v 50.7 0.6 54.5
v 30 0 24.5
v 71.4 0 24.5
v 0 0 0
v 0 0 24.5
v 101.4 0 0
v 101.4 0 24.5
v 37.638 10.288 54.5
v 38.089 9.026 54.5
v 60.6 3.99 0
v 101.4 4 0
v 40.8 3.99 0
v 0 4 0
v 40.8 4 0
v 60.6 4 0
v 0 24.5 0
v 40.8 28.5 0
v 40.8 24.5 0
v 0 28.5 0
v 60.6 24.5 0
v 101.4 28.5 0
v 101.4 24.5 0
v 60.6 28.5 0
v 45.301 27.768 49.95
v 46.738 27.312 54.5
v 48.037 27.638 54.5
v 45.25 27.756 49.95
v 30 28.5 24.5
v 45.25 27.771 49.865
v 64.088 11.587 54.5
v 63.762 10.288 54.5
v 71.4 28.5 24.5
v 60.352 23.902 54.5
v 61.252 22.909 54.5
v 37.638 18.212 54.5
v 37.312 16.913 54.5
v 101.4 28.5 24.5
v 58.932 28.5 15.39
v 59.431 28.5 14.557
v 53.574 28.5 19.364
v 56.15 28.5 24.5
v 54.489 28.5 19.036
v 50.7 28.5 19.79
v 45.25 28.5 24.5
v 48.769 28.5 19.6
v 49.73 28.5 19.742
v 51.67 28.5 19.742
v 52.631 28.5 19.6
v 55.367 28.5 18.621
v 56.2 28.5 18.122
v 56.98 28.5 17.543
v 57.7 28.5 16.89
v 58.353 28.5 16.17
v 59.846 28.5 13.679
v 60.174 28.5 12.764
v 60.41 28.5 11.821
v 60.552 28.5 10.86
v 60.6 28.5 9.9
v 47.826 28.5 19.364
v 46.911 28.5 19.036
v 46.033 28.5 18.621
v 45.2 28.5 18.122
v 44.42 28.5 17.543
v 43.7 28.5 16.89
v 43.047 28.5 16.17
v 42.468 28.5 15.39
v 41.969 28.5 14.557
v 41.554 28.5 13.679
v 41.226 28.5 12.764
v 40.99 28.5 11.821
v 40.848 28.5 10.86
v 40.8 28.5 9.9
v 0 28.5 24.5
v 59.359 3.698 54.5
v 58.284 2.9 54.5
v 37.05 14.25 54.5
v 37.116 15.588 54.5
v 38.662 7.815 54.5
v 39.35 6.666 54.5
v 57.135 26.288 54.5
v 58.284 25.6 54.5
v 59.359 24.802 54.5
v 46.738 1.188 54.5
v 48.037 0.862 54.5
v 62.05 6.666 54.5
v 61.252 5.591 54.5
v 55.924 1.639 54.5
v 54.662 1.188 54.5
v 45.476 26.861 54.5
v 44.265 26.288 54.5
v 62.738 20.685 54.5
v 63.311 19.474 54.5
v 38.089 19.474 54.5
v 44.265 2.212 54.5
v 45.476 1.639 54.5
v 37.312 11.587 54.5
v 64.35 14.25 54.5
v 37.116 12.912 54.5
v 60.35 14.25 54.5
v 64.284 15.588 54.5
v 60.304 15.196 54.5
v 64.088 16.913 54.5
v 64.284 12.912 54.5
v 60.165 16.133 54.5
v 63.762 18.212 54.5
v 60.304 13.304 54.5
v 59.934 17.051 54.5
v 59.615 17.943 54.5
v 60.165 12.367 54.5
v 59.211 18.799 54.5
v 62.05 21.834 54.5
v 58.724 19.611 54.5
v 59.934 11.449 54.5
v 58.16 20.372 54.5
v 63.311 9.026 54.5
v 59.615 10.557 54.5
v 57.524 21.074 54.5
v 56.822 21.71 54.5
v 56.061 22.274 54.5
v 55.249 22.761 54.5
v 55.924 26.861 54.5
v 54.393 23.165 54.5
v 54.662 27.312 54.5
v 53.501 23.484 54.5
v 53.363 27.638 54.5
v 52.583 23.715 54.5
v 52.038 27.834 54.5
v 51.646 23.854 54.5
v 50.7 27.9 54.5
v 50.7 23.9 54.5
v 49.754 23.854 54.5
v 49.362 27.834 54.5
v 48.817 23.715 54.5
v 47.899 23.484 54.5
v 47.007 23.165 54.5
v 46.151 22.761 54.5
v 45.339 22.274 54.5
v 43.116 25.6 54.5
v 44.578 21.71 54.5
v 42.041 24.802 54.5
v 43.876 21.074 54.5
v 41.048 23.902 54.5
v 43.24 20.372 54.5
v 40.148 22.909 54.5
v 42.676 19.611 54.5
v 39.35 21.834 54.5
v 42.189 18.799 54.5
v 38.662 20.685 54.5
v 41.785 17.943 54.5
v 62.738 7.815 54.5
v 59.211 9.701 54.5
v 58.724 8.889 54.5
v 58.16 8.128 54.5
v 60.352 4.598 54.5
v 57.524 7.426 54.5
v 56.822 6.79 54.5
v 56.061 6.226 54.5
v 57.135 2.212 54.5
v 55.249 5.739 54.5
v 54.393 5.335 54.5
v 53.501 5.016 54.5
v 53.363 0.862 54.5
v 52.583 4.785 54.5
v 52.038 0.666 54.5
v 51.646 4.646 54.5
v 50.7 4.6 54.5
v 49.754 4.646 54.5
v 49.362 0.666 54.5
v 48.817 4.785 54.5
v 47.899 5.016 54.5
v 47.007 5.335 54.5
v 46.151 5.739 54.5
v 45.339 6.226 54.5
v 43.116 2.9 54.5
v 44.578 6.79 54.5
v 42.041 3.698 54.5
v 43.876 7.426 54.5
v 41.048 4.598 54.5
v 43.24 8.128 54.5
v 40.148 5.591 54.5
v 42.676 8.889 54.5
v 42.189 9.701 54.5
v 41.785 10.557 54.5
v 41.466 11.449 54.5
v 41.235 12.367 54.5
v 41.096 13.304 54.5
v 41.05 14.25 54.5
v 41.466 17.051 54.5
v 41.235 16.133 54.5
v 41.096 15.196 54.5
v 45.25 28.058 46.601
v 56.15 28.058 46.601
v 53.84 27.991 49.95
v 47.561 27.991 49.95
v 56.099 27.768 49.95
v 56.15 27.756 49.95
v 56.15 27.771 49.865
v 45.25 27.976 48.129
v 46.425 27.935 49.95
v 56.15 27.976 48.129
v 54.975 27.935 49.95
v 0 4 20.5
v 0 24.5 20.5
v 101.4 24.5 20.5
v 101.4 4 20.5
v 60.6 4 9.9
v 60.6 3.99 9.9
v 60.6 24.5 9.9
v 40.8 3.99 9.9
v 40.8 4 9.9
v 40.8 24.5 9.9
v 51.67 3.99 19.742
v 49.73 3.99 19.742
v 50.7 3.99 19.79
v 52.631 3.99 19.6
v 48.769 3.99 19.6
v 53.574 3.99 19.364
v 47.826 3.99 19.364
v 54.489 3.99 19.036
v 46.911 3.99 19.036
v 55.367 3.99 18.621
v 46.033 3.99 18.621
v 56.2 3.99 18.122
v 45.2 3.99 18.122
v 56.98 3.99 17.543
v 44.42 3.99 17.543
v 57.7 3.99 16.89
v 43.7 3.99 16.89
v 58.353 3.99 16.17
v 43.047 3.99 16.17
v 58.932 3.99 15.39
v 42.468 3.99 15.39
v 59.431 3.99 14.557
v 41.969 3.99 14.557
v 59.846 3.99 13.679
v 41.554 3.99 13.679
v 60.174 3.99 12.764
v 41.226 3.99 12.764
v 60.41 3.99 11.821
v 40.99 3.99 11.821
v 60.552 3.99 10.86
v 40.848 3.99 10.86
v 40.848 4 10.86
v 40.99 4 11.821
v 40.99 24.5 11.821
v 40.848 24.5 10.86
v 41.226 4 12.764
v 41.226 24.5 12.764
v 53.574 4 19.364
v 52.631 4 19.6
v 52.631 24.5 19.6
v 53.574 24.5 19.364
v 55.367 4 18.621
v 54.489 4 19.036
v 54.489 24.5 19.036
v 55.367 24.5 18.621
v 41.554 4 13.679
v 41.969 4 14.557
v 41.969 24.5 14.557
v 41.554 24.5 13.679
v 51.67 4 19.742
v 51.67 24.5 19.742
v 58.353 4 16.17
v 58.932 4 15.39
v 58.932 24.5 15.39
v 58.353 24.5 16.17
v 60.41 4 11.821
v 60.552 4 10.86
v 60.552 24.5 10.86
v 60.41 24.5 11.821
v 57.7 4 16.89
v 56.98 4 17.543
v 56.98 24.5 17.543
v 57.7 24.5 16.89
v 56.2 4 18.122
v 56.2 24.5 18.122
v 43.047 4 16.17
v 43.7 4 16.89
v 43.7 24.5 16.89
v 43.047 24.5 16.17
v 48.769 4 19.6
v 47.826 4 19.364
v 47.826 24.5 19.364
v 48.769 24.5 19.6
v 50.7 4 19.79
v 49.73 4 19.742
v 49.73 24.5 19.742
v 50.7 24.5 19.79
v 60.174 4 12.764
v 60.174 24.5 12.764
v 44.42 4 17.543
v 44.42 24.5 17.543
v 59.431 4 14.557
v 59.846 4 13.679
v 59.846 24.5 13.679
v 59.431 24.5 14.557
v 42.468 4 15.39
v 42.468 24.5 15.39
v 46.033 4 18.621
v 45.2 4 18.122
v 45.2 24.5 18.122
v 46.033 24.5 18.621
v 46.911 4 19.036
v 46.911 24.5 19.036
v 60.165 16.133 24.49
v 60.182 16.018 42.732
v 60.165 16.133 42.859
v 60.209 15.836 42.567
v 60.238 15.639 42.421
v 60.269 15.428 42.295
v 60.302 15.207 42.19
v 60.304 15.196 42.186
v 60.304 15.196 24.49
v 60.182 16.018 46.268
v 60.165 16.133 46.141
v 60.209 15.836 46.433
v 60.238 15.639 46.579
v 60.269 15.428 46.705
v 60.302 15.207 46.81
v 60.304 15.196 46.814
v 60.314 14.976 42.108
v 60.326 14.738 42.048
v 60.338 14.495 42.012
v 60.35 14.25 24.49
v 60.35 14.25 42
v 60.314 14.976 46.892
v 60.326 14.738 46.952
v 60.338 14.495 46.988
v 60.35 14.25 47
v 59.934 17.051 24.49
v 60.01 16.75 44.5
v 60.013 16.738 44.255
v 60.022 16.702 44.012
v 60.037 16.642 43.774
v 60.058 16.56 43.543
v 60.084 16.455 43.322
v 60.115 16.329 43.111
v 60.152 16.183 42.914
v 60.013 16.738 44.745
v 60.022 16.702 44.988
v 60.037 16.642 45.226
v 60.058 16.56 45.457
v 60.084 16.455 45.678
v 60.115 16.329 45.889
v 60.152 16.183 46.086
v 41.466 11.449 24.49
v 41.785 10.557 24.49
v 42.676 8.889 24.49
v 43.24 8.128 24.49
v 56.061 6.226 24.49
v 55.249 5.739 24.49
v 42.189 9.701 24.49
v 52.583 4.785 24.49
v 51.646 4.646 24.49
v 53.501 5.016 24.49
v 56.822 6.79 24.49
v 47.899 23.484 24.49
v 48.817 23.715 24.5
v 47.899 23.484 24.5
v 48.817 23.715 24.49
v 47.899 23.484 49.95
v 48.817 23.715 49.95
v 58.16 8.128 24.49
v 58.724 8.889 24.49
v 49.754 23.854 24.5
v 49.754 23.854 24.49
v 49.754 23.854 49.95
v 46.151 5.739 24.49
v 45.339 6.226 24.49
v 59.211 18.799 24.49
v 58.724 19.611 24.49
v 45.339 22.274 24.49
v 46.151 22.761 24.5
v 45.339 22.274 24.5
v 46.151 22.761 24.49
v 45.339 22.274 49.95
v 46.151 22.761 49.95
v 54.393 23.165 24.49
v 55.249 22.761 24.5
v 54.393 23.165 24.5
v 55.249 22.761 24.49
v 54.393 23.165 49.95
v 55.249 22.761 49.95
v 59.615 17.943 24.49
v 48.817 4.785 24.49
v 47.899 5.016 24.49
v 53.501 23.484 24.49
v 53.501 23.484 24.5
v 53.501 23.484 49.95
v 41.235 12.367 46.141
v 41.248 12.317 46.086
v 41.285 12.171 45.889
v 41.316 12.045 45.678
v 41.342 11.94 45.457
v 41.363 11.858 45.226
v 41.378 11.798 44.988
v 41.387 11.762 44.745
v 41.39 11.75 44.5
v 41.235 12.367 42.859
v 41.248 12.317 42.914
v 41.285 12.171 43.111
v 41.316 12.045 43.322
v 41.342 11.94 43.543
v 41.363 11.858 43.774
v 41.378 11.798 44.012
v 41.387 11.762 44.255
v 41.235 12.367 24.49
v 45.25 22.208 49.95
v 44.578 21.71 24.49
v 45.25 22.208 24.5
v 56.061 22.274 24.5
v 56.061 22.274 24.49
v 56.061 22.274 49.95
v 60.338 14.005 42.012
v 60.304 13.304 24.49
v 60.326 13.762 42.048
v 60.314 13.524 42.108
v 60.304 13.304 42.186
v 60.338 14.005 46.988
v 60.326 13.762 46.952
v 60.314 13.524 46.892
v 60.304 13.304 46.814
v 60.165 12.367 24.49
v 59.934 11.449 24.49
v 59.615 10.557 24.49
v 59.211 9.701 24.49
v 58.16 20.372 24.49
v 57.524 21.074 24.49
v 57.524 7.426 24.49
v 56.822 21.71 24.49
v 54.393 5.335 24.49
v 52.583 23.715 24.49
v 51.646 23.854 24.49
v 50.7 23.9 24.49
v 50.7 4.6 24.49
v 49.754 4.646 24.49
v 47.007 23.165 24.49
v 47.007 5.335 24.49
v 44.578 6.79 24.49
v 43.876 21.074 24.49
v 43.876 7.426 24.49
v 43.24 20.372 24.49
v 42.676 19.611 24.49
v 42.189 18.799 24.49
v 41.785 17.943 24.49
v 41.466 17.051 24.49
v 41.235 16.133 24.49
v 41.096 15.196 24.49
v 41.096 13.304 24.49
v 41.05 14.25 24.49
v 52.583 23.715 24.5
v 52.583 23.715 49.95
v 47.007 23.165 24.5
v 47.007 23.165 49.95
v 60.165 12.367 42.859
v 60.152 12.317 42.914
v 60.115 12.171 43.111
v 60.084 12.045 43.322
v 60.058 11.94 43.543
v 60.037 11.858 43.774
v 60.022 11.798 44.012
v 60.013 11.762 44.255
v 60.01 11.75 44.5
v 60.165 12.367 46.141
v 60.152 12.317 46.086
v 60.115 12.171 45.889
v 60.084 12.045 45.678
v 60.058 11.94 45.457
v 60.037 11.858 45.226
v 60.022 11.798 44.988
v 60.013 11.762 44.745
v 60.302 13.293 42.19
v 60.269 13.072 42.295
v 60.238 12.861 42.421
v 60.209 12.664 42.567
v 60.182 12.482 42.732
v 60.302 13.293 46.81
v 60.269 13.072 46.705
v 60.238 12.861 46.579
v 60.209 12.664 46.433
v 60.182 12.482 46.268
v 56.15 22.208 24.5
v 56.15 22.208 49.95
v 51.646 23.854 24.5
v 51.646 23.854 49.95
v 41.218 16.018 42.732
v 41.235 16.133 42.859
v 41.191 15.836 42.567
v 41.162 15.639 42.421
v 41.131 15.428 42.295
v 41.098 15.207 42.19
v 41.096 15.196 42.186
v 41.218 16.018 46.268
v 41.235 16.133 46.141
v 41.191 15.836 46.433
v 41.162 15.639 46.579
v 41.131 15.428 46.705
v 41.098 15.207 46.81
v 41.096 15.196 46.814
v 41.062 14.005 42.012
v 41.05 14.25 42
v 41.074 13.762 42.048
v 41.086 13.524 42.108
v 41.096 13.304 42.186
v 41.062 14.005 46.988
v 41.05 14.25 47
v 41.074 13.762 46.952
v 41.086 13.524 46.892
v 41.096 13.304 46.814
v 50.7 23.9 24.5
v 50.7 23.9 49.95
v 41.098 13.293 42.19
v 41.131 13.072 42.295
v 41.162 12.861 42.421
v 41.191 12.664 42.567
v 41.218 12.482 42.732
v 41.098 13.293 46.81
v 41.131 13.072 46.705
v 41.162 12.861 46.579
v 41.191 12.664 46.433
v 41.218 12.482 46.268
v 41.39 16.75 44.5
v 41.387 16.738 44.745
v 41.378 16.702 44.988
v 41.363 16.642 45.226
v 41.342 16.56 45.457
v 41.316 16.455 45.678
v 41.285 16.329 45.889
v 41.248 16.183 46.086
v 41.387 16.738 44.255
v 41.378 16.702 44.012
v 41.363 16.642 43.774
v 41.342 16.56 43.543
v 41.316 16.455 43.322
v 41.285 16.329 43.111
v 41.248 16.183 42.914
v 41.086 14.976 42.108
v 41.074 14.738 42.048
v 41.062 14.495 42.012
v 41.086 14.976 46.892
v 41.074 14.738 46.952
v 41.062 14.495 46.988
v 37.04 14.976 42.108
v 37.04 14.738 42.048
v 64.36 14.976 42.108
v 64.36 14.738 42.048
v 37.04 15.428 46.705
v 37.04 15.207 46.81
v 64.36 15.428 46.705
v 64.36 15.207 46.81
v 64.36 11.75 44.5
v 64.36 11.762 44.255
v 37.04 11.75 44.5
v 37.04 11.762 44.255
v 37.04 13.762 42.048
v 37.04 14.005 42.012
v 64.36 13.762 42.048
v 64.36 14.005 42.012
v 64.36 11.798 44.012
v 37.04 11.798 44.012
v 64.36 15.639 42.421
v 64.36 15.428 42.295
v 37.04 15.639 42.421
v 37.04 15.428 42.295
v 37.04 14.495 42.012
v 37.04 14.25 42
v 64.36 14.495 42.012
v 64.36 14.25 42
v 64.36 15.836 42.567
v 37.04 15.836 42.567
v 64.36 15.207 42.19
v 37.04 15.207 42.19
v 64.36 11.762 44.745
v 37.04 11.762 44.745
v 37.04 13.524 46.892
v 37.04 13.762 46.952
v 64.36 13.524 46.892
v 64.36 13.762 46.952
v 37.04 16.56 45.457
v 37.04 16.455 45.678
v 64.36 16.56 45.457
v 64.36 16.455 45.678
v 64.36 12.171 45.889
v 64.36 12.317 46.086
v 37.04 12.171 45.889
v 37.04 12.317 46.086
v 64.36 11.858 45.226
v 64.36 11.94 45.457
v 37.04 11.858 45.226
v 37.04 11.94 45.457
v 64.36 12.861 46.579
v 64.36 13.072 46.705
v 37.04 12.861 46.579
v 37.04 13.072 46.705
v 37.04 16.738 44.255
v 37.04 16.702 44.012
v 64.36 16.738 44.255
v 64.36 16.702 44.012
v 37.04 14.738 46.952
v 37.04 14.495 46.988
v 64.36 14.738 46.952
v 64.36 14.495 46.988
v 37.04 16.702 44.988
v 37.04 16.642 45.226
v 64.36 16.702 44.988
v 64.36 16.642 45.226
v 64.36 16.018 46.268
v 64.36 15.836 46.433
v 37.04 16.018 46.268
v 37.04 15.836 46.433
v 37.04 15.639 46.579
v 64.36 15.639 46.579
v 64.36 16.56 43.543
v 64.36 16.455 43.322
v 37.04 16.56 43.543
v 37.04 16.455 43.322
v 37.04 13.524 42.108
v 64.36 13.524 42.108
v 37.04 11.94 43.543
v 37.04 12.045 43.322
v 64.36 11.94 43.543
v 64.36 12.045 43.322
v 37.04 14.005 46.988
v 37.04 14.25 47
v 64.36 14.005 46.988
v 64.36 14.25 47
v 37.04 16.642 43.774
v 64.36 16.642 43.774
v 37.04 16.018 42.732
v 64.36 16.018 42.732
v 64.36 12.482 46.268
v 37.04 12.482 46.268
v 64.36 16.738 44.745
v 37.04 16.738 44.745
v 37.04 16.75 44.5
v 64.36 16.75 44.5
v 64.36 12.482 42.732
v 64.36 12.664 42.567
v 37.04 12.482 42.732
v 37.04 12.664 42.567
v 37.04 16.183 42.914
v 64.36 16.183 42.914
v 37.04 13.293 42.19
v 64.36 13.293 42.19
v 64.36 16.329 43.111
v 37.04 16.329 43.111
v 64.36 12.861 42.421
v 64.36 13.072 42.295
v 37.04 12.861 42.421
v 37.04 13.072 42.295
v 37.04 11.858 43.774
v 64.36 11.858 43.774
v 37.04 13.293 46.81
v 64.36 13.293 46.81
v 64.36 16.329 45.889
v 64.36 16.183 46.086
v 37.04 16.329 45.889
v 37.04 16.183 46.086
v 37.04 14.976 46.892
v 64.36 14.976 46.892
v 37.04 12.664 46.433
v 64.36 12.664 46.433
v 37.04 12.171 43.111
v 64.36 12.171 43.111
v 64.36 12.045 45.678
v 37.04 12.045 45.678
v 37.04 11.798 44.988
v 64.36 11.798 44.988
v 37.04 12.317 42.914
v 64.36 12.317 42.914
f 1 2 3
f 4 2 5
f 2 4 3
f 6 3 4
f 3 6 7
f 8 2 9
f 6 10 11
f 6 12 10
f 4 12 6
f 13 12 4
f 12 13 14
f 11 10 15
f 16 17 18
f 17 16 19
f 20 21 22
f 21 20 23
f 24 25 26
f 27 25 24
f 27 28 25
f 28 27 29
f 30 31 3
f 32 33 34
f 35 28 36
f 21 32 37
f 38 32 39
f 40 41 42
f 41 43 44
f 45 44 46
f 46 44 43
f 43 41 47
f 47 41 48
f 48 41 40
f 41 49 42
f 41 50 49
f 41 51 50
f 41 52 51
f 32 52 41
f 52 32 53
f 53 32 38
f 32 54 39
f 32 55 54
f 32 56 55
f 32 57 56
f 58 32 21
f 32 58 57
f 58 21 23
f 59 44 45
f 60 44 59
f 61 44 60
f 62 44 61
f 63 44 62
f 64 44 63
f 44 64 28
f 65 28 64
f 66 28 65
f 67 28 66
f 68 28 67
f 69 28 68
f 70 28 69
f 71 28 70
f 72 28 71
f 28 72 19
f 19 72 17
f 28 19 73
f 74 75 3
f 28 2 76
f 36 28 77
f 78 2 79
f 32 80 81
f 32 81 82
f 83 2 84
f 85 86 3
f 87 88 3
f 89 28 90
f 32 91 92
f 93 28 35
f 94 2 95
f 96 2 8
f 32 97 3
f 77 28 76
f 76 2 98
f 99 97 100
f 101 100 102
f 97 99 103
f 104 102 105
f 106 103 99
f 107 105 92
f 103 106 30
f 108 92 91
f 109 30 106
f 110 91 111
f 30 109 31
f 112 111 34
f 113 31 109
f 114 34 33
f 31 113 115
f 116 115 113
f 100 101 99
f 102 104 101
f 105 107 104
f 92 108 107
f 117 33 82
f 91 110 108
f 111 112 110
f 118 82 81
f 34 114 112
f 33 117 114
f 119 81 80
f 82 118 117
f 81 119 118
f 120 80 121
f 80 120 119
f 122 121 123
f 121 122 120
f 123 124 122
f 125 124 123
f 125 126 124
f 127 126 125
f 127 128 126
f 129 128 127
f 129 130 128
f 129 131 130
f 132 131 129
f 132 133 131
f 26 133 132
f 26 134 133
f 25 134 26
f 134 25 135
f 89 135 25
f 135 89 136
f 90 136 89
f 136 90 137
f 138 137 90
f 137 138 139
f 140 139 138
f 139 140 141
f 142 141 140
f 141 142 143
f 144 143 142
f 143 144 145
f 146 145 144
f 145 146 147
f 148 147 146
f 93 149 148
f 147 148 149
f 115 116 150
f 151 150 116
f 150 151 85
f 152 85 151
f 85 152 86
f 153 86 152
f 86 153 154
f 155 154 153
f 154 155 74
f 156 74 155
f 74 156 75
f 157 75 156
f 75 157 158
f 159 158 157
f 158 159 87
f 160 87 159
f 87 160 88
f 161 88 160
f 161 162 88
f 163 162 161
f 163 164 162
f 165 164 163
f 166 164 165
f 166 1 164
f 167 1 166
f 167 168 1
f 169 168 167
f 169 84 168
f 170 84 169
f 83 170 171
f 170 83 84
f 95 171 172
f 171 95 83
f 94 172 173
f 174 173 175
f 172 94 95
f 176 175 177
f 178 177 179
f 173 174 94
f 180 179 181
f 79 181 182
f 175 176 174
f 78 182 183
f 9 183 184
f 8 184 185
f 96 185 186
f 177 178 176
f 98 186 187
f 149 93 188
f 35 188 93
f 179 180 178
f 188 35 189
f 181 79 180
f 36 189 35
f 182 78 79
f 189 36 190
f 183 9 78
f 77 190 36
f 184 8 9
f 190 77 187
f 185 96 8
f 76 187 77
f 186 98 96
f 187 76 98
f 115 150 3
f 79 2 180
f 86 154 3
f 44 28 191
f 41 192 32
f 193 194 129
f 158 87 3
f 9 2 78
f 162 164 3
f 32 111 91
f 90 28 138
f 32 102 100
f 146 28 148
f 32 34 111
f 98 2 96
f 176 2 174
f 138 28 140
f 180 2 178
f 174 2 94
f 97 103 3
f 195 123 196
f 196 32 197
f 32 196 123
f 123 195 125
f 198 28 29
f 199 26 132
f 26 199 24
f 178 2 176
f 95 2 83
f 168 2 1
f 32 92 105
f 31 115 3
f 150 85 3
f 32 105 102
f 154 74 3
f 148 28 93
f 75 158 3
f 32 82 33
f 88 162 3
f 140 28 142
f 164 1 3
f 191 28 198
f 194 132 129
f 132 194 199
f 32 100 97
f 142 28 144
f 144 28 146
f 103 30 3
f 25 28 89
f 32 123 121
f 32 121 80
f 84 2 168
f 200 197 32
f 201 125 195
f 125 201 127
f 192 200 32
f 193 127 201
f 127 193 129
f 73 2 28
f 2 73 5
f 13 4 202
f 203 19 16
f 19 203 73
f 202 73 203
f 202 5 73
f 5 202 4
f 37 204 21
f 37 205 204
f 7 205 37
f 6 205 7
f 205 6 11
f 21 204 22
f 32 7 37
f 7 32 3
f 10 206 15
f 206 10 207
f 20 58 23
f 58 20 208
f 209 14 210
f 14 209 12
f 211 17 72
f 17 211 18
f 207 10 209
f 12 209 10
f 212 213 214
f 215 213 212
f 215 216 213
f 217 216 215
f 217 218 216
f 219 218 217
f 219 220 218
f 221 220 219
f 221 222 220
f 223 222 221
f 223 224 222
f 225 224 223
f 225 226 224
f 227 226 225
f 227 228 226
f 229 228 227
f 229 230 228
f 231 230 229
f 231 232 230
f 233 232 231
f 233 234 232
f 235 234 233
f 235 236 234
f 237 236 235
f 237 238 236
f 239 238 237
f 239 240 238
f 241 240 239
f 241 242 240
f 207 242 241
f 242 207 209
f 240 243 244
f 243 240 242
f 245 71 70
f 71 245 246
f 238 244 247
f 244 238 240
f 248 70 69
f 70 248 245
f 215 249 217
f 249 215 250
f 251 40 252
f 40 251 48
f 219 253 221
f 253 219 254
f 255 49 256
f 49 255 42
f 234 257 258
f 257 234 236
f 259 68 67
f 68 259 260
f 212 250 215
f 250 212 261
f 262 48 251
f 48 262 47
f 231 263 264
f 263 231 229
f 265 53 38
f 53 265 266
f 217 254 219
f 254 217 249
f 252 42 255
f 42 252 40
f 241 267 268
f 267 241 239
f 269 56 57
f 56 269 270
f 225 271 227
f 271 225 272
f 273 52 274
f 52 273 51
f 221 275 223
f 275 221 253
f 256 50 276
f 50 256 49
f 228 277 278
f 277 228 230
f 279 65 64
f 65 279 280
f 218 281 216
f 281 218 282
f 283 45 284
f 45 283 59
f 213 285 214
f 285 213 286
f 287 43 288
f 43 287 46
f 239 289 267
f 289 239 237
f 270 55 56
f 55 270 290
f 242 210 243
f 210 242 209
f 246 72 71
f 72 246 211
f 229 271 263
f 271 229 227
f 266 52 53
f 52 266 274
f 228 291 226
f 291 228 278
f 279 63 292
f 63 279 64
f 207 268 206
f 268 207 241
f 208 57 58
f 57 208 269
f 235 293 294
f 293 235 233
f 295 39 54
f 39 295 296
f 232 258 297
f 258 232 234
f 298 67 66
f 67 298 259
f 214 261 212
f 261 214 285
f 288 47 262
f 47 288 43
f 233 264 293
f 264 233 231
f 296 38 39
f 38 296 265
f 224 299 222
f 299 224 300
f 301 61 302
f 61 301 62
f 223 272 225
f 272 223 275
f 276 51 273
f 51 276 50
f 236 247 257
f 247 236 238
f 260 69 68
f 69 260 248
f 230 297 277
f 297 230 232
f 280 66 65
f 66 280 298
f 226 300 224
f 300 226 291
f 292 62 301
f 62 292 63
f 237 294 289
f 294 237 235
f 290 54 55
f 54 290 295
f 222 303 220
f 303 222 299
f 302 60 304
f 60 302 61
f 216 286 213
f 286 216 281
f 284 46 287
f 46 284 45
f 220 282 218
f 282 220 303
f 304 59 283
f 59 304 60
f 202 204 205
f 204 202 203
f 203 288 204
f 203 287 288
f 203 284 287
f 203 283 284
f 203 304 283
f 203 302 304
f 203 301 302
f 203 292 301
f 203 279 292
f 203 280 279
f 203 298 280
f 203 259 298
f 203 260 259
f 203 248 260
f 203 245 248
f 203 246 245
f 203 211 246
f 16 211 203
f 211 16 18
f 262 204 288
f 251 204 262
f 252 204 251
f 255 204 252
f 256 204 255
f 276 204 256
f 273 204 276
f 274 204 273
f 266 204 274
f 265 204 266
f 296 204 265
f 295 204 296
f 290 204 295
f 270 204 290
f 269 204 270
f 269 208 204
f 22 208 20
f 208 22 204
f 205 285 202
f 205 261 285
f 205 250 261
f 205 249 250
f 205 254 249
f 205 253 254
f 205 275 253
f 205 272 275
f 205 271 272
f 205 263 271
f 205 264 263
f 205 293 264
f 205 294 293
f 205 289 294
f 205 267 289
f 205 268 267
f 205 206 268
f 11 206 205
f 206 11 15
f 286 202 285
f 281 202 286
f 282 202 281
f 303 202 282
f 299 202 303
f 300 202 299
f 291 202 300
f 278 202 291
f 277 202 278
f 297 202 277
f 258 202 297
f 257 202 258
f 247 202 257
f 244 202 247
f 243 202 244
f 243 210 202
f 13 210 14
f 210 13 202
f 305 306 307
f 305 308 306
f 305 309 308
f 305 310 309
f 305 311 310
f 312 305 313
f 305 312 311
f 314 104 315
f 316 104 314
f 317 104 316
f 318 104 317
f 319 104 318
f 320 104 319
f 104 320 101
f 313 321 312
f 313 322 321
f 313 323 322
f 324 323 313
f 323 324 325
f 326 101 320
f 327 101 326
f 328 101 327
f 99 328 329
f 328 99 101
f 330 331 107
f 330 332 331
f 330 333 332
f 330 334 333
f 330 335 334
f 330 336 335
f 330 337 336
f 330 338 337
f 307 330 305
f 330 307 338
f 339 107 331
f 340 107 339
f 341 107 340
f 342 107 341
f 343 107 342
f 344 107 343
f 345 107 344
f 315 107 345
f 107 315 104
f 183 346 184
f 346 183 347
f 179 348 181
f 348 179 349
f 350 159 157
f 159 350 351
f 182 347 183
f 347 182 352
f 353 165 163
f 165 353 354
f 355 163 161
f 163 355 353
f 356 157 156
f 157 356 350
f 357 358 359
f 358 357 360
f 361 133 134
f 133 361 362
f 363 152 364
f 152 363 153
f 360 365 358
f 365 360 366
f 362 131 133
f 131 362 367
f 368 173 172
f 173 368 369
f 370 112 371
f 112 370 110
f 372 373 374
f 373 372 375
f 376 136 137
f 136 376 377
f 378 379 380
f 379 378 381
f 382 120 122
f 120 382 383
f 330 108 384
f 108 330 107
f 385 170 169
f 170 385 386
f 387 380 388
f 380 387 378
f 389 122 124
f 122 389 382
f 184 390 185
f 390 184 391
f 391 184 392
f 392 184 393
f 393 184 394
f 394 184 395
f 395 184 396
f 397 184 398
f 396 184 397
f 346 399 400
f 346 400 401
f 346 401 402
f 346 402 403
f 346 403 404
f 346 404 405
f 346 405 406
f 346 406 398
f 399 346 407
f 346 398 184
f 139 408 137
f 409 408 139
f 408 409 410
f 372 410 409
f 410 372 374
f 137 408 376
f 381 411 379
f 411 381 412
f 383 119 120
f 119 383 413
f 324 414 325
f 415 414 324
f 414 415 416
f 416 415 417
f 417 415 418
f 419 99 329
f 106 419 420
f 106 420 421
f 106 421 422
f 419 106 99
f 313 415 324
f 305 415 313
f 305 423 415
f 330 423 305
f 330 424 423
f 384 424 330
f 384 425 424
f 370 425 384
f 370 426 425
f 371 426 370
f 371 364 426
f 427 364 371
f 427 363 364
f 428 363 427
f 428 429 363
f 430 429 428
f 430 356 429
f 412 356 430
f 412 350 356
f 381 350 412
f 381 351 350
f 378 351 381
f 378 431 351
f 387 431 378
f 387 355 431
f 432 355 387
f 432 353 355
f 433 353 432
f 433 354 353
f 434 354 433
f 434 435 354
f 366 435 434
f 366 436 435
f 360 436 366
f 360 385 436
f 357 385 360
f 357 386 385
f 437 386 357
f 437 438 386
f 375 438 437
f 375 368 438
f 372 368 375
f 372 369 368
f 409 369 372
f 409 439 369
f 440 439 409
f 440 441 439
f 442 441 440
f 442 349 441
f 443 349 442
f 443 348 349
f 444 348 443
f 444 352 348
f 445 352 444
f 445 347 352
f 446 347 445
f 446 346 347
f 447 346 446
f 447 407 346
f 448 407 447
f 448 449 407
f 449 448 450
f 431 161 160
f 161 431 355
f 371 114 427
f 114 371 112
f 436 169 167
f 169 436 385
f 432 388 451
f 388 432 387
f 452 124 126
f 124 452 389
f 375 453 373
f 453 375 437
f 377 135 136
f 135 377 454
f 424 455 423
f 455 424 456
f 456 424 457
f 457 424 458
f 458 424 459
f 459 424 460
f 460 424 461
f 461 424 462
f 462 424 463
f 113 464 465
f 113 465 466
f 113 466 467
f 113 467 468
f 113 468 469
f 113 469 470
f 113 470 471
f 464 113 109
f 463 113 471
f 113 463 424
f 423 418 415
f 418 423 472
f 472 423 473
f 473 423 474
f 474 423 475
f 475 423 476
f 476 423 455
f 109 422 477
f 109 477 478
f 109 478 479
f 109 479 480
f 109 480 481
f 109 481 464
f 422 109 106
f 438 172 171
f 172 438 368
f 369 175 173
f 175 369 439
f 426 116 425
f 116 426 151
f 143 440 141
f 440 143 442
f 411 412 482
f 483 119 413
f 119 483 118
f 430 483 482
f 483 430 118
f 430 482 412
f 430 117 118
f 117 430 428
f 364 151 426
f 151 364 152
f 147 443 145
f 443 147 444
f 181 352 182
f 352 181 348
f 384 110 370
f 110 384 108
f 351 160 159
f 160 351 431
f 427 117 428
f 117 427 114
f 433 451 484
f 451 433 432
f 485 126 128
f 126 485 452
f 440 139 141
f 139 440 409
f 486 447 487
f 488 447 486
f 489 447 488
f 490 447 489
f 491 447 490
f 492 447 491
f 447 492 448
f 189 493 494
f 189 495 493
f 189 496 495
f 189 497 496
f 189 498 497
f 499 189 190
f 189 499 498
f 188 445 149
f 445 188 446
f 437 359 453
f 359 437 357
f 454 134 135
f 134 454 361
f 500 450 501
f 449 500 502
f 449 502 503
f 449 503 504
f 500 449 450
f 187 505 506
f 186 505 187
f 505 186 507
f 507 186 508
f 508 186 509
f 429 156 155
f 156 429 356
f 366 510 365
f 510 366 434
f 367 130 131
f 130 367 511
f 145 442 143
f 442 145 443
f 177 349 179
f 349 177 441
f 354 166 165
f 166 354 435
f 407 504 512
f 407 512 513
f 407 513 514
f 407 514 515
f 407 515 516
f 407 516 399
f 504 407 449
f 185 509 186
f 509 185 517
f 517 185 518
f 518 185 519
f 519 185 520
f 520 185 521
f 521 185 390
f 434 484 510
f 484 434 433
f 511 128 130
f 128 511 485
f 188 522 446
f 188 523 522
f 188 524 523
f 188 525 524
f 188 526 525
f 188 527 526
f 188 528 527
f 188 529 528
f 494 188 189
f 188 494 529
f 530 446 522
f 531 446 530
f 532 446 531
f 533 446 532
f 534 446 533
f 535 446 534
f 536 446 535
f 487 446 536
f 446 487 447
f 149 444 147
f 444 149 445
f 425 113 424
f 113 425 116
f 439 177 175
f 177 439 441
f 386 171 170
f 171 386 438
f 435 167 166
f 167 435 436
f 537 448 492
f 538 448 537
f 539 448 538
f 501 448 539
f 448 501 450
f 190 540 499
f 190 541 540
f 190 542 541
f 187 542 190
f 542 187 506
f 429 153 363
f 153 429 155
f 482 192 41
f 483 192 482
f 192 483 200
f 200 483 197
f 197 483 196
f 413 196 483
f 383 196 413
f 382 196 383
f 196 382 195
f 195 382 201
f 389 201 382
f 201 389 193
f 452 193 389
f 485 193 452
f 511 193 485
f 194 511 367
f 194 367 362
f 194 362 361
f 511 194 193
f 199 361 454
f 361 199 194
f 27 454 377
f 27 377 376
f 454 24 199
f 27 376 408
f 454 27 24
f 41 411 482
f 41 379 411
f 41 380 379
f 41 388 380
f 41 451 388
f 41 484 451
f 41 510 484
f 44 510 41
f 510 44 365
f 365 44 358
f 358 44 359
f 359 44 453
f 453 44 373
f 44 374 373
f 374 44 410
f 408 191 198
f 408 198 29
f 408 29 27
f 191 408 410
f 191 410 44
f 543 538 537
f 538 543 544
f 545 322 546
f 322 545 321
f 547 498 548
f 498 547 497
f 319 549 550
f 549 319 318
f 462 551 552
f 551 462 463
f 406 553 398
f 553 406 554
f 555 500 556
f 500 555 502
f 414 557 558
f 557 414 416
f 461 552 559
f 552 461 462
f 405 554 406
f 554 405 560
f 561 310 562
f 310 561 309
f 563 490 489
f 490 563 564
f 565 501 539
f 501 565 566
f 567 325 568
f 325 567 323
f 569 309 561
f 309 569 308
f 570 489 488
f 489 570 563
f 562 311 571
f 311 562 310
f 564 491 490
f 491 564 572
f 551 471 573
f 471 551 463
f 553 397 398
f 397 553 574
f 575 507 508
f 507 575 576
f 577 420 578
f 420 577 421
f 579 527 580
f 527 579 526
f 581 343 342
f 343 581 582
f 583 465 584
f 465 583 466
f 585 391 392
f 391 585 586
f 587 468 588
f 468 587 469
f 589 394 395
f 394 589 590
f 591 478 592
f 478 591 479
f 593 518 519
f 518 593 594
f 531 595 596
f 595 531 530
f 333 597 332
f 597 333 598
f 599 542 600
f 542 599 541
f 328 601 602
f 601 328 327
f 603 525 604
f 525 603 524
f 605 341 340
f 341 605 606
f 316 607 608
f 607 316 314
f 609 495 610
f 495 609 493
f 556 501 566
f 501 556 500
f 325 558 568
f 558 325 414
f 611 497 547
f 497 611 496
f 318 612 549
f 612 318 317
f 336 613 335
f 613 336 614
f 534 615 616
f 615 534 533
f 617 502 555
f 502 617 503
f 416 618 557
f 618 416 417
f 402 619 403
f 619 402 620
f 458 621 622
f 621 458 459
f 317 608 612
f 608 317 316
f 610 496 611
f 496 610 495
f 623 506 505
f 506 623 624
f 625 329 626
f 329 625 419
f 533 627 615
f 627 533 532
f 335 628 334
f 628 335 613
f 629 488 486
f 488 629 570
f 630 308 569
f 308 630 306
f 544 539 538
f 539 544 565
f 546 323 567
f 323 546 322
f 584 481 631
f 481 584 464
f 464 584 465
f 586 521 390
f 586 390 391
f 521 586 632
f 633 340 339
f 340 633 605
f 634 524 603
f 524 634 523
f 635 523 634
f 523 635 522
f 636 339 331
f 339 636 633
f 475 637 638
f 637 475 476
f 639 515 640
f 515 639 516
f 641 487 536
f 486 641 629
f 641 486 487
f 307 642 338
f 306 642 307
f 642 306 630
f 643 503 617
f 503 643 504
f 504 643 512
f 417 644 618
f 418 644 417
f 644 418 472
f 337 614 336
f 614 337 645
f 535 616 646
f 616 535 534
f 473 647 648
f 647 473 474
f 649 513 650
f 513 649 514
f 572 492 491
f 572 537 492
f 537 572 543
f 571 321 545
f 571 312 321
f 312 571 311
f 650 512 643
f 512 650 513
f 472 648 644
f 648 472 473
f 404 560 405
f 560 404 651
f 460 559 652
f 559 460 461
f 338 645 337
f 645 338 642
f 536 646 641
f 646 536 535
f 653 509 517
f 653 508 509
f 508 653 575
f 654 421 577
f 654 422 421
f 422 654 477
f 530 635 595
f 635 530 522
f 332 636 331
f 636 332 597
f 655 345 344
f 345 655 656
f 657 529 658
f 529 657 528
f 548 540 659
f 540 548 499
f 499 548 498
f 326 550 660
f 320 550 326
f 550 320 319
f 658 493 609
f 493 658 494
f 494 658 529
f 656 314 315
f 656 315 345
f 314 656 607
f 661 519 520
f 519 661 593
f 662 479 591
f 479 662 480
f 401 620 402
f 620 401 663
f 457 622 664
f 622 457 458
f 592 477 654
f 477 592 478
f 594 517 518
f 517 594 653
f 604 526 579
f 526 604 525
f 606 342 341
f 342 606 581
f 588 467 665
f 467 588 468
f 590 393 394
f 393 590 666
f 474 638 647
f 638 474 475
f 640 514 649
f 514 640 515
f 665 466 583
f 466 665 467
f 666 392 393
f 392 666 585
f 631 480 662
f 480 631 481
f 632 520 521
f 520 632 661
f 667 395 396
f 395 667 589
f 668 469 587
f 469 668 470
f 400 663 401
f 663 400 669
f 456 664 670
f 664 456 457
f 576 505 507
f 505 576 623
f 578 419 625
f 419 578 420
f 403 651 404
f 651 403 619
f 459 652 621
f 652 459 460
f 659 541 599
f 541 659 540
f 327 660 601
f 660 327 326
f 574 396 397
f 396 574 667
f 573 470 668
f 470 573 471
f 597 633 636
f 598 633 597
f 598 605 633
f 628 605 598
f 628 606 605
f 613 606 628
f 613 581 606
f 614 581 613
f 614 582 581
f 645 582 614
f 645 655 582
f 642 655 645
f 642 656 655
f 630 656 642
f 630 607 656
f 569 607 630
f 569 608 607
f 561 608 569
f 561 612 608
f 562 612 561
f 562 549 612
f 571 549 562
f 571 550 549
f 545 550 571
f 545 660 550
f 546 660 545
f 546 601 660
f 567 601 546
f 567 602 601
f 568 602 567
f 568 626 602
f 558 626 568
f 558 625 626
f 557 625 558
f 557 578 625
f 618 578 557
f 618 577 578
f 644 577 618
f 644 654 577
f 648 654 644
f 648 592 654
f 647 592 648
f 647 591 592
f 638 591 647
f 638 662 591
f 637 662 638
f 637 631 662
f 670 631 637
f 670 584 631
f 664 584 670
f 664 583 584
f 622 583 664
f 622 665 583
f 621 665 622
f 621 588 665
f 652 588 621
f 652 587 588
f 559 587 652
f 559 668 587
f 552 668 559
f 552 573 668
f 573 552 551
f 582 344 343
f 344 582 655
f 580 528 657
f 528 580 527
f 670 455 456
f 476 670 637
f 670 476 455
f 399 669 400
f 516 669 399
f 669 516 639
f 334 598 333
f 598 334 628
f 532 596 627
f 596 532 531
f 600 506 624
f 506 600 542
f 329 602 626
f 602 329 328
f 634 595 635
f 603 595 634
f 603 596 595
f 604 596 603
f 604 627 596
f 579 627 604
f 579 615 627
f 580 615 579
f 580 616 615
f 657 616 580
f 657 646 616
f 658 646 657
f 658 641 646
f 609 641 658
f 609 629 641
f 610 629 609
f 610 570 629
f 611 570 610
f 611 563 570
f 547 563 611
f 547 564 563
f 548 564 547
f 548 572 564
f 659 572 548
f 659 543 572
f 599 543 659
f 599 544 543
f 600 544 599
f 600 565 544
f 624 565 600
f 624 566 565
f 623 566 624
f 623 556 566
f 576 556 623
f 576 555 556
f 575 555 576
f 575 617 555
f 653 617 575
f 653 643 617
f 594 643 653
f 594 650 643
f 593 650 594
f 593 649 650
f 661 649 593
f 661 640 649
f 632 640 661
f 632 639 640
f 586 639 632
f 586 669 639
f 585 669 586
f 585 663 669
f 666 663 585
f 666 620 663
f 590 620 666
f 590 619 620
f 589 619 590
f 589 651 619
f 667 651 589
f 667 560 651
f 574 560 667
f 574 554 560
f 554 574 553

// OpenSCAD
// file: ../lib/common.scad
// ─── common.scad ─────────────────────────────────────────────────────────────
// Shared utility modules for the 3D model project.
// Include with:  include <../lib/common.scad>
// ─────────────────────────────────────────────────────────────────────────────

$fn = 64; // global circle/sphere smoothness

// ── Rounded box ──────────────────────────────────────────────────────────────
// w/d/h = outer dimensions, r = corner radius
module rounded_box(w, d, h, r = 2) {
    hull() {
        for (x = [r, w - r])
        for (y = [r, d - r])
            translate([x, y, 0])
                cylinder(r = r, h = h);
    }
}

// ── Rounded box with optional hollow interior ─────────────────────────────────
// wall = wall thickness; set to 0 for a solid block
module box_shell(w, d, h, r = 2, wall = 1.5) {
    if (wall <= 0) {
        rounded_box(w, d, h, r);
    } else {
        difference() {
            rounded_box(w, d, h, r);
            translate([wall, wall, wall])
                rounded_box(w - wall*2, d - wall*2, h, max(r - wall, 0.1));
        }
    }
}

// ── Countersunk hole (for M-series screws) ────────────────────────────────────
// d_shaft = shaft diameter, d_head = countersink diameter, depth = head depth
module countersink(d_shaft, d_head, depth, h_total) {
    union() {
        cylinder(d = d_shaft, h = h_total);
        cylinder(d1 = d_head, d2 = d_shaft, h = depth);
    }
}

// ── Slot (oblong hole) ────────────────────────────────────────────────────────
// len = total length along X, w = width, h = depth
module slot(len, w, h) {
    r = w / 2;
    hull() {
        translate([r, 0, 0]) cylinder(r = r, h = h);
        translate([len - r, 0, 0]) cylinder(r = r, h = h);
    }
}

// ── Snap-fit clip (cantilever, +X direction) ─────────────────────────────────
// arm_l/w/h = arm dimensions, tip_h = tip protrusion
module snap_clip(arm_l = 10, arm_w = 4, arm_h = 1.5, tip_h = 1) {
    cube([arm_l, arm_w, arm_h]);
    translate([arm_l - tip_h, 0, arm_h])
        cube([tip_h, arm_w, tip_h]);
}

// ── Text label (recessed) ─────────────────────────────────────────────────────
// Use inside a difference(). t = text string, s = font size, depth = recess
module label(t, s = 5, depth = 0.5) {
    linear_extrude(depth)
        text(t, size = s, halign = "center", valign = "center");
}
// main file
// ─── tube_support_clamp.scad ──────────────────────────────────────────────────
// Saddle bracket that presses DOWN onto a square bar (lying flat, running in X).
// Round tube socket rises from the top centre.
// Coordinate convention matches the bar:
//   X = along bar length (bracket straddles this)
//   Y = bar depth  (20.7 mm)
//   Z = bar height (20.7 mm) — bracket presses down over this
//
// Print orientation: upside-down (socket pointing at build plate).
// ─────────────────────────────────────────────────────────────────────────────

include <../lib/common.scad>

// ── Parameters ────────────────────────────────────────────────────────────────

WALL = 4;                    // wall thickness (mm)

// Square bar cross-section  — -0.2 mm interference on each bore dimension
BAR_Y          = 20.7;       // bar depth  (Y)
BAR_Z          = 20.7;       // bar height (Z)
BORE_Y         = BAR_Y - 0.2;
BORE_Z         = BAR_Z - 0.2;

// Central hull width (socket diameter + walls each side)
GRIP_X         = BAR_Y * 2;  // core width around socket
// Wing extensions — extra grip length on each X side beyond the core
WING_X         = 30;

// Round vertical tube — -0.2 mm interference press fit
TUBE_OD        = 19.5;
TUBE_BORE      = TUBE_OD - 0.2;
SOCKET_DEPTH   = 30;         // insertion depth of round tube

// Squared nut (inside round socket, locks tube)
NUT_W          = 10.3;
NUT_THICK      = 5;
NUT_FROM_FLOOR = 20;         // distance from socket floor to nut centre
NUT_SLOT_W     = NUT_W + 0.6;
NUT_SLOT_T     = NUT_THICK + 0.4;

// Wing screw shaft clearance
SCREW_D        = 5;

// ── Derived ───────────────────────────────────────────────────────────────────

// Core saddle (around socket)
SADDLE_X  = GRIP_X;
SADDLE_Y  = BORE_Y + WALL * 2;
SADDLE_Z  = BORE_Z + WALL;       // WALL roof + bar height (open at bottom)

// Full width including wings
TOTAL_X   = SADDLE_X + WING_X * 2;

SOCKET_OD = TUBE_BORE + WALL * 2;

// Socket centre — offset by WING_X so it stays centred on TOTAL_X
CX = WING_X + SADDLE_X / 2;
CY = SADDLE_Y / 2;

// ── Body — central hull + flat wings on each X side ───────────────────────────
module body() {
    union() {
        // central hull: tapers from core saddle block up to socket cylinder
        translate([WING_X, 0, 0])
            hull() {
                cube([SADDLE_X, SADDLE_Y, SADDLE_Z]);
                translate([SADDLE_X / 2, CY, SADDLE_Z])
                    cylinder(d = SOCKET_OD, h = SOCKET_DEPTH);
            }
        // left wing — flat saddle slab, same Y and Z as core
        cube([WING_X, SADDLE_Y, SADDLE_Z]);
        // right wing
        translate([WING_X + SADDLE_X, 0, 0])
            cube([WING_X, SADDLE_Y, SADDLE_Z]);
    }
}

// ── Bar channel — U-slot spanning full width including wings ──────────────────
module bar_channel() {
    translate([-0.01, WALL, -0.01])
        cube([TOTAL_X + 0.02, BORE_Y, BORE_Z + 0.01]);
}

// ── Front tube opening — arch slot through front wall only ────────────────────
// Starts at Y=WALL (inner face of front wall) and exits at Y=SADDLE_Y (outer face).
// Leaves the back wall (Y=0 to Y=WALL) intact.
// Open at Z=0 so the tube slides in from below.
module front_tube_opening() {
    tube_r = (TUBE_OD + 0.3) / 2;
    // cut depth = from inner face of front wall to outside
    cut_depth = SADDLE_Y - WALL + 0.02;
    translate([CX, WALL - 0.01, -0.01]) {
        // rectangular stem from bottom up to arch start
        translate([-tube_r, 0, 0])
            cube([tube_r * 2, cut_depth, tube_r + 0.01]);
        // arched top
        translate([0, 0, tube_r])
            rotate([-90, 0, 0])
                cylinder(r = tube_r, h = cut_depth);
    }
}

// ── Round tube socket bore ────────────────────────────────────────────────────
module round_bore() {
    translate([CX, CY, SADDLE_Z - 0.01])
        cylinder(d = TUBE_BORE, h = SOCKET_DEPTH + 0.02);
}

// ── Nut slot — faces +Y (front), from socket floor up to nut top ──────────────
module nut_slot() {
    translate([CX - NUT_SLOT_W / 2, CY - NUT_SLOT_T / 2, SADDLE_Z])
        cube([NUT_SLOT_W, SOCKET_OD, NUT_FROM_FLOOR + NUT_SLOT_W / 2]);
}

// ── Wing screw bore — only through socket cylinder walls at nut height ─────────
module screw_bore() {
    // limited to SOCKET_OD width so it doesn't exit through the taper
    translate([CX - SOCKET_OD / 2 - 0.01, CY, SADDLE_Z + NUT_FROM_FLOOR])
        rotate([0, 90, 0])
            cylinder(d = SCREW_D, h = SOCKET_OD + 0.02);
}

// ── Assembly ──────────────────────────────────────────────────────────────────
difference() {
    body();
    bar_channel();
    front_tube_opening();
    round_bore();
    nut_slot();
    screw_bore();
}
